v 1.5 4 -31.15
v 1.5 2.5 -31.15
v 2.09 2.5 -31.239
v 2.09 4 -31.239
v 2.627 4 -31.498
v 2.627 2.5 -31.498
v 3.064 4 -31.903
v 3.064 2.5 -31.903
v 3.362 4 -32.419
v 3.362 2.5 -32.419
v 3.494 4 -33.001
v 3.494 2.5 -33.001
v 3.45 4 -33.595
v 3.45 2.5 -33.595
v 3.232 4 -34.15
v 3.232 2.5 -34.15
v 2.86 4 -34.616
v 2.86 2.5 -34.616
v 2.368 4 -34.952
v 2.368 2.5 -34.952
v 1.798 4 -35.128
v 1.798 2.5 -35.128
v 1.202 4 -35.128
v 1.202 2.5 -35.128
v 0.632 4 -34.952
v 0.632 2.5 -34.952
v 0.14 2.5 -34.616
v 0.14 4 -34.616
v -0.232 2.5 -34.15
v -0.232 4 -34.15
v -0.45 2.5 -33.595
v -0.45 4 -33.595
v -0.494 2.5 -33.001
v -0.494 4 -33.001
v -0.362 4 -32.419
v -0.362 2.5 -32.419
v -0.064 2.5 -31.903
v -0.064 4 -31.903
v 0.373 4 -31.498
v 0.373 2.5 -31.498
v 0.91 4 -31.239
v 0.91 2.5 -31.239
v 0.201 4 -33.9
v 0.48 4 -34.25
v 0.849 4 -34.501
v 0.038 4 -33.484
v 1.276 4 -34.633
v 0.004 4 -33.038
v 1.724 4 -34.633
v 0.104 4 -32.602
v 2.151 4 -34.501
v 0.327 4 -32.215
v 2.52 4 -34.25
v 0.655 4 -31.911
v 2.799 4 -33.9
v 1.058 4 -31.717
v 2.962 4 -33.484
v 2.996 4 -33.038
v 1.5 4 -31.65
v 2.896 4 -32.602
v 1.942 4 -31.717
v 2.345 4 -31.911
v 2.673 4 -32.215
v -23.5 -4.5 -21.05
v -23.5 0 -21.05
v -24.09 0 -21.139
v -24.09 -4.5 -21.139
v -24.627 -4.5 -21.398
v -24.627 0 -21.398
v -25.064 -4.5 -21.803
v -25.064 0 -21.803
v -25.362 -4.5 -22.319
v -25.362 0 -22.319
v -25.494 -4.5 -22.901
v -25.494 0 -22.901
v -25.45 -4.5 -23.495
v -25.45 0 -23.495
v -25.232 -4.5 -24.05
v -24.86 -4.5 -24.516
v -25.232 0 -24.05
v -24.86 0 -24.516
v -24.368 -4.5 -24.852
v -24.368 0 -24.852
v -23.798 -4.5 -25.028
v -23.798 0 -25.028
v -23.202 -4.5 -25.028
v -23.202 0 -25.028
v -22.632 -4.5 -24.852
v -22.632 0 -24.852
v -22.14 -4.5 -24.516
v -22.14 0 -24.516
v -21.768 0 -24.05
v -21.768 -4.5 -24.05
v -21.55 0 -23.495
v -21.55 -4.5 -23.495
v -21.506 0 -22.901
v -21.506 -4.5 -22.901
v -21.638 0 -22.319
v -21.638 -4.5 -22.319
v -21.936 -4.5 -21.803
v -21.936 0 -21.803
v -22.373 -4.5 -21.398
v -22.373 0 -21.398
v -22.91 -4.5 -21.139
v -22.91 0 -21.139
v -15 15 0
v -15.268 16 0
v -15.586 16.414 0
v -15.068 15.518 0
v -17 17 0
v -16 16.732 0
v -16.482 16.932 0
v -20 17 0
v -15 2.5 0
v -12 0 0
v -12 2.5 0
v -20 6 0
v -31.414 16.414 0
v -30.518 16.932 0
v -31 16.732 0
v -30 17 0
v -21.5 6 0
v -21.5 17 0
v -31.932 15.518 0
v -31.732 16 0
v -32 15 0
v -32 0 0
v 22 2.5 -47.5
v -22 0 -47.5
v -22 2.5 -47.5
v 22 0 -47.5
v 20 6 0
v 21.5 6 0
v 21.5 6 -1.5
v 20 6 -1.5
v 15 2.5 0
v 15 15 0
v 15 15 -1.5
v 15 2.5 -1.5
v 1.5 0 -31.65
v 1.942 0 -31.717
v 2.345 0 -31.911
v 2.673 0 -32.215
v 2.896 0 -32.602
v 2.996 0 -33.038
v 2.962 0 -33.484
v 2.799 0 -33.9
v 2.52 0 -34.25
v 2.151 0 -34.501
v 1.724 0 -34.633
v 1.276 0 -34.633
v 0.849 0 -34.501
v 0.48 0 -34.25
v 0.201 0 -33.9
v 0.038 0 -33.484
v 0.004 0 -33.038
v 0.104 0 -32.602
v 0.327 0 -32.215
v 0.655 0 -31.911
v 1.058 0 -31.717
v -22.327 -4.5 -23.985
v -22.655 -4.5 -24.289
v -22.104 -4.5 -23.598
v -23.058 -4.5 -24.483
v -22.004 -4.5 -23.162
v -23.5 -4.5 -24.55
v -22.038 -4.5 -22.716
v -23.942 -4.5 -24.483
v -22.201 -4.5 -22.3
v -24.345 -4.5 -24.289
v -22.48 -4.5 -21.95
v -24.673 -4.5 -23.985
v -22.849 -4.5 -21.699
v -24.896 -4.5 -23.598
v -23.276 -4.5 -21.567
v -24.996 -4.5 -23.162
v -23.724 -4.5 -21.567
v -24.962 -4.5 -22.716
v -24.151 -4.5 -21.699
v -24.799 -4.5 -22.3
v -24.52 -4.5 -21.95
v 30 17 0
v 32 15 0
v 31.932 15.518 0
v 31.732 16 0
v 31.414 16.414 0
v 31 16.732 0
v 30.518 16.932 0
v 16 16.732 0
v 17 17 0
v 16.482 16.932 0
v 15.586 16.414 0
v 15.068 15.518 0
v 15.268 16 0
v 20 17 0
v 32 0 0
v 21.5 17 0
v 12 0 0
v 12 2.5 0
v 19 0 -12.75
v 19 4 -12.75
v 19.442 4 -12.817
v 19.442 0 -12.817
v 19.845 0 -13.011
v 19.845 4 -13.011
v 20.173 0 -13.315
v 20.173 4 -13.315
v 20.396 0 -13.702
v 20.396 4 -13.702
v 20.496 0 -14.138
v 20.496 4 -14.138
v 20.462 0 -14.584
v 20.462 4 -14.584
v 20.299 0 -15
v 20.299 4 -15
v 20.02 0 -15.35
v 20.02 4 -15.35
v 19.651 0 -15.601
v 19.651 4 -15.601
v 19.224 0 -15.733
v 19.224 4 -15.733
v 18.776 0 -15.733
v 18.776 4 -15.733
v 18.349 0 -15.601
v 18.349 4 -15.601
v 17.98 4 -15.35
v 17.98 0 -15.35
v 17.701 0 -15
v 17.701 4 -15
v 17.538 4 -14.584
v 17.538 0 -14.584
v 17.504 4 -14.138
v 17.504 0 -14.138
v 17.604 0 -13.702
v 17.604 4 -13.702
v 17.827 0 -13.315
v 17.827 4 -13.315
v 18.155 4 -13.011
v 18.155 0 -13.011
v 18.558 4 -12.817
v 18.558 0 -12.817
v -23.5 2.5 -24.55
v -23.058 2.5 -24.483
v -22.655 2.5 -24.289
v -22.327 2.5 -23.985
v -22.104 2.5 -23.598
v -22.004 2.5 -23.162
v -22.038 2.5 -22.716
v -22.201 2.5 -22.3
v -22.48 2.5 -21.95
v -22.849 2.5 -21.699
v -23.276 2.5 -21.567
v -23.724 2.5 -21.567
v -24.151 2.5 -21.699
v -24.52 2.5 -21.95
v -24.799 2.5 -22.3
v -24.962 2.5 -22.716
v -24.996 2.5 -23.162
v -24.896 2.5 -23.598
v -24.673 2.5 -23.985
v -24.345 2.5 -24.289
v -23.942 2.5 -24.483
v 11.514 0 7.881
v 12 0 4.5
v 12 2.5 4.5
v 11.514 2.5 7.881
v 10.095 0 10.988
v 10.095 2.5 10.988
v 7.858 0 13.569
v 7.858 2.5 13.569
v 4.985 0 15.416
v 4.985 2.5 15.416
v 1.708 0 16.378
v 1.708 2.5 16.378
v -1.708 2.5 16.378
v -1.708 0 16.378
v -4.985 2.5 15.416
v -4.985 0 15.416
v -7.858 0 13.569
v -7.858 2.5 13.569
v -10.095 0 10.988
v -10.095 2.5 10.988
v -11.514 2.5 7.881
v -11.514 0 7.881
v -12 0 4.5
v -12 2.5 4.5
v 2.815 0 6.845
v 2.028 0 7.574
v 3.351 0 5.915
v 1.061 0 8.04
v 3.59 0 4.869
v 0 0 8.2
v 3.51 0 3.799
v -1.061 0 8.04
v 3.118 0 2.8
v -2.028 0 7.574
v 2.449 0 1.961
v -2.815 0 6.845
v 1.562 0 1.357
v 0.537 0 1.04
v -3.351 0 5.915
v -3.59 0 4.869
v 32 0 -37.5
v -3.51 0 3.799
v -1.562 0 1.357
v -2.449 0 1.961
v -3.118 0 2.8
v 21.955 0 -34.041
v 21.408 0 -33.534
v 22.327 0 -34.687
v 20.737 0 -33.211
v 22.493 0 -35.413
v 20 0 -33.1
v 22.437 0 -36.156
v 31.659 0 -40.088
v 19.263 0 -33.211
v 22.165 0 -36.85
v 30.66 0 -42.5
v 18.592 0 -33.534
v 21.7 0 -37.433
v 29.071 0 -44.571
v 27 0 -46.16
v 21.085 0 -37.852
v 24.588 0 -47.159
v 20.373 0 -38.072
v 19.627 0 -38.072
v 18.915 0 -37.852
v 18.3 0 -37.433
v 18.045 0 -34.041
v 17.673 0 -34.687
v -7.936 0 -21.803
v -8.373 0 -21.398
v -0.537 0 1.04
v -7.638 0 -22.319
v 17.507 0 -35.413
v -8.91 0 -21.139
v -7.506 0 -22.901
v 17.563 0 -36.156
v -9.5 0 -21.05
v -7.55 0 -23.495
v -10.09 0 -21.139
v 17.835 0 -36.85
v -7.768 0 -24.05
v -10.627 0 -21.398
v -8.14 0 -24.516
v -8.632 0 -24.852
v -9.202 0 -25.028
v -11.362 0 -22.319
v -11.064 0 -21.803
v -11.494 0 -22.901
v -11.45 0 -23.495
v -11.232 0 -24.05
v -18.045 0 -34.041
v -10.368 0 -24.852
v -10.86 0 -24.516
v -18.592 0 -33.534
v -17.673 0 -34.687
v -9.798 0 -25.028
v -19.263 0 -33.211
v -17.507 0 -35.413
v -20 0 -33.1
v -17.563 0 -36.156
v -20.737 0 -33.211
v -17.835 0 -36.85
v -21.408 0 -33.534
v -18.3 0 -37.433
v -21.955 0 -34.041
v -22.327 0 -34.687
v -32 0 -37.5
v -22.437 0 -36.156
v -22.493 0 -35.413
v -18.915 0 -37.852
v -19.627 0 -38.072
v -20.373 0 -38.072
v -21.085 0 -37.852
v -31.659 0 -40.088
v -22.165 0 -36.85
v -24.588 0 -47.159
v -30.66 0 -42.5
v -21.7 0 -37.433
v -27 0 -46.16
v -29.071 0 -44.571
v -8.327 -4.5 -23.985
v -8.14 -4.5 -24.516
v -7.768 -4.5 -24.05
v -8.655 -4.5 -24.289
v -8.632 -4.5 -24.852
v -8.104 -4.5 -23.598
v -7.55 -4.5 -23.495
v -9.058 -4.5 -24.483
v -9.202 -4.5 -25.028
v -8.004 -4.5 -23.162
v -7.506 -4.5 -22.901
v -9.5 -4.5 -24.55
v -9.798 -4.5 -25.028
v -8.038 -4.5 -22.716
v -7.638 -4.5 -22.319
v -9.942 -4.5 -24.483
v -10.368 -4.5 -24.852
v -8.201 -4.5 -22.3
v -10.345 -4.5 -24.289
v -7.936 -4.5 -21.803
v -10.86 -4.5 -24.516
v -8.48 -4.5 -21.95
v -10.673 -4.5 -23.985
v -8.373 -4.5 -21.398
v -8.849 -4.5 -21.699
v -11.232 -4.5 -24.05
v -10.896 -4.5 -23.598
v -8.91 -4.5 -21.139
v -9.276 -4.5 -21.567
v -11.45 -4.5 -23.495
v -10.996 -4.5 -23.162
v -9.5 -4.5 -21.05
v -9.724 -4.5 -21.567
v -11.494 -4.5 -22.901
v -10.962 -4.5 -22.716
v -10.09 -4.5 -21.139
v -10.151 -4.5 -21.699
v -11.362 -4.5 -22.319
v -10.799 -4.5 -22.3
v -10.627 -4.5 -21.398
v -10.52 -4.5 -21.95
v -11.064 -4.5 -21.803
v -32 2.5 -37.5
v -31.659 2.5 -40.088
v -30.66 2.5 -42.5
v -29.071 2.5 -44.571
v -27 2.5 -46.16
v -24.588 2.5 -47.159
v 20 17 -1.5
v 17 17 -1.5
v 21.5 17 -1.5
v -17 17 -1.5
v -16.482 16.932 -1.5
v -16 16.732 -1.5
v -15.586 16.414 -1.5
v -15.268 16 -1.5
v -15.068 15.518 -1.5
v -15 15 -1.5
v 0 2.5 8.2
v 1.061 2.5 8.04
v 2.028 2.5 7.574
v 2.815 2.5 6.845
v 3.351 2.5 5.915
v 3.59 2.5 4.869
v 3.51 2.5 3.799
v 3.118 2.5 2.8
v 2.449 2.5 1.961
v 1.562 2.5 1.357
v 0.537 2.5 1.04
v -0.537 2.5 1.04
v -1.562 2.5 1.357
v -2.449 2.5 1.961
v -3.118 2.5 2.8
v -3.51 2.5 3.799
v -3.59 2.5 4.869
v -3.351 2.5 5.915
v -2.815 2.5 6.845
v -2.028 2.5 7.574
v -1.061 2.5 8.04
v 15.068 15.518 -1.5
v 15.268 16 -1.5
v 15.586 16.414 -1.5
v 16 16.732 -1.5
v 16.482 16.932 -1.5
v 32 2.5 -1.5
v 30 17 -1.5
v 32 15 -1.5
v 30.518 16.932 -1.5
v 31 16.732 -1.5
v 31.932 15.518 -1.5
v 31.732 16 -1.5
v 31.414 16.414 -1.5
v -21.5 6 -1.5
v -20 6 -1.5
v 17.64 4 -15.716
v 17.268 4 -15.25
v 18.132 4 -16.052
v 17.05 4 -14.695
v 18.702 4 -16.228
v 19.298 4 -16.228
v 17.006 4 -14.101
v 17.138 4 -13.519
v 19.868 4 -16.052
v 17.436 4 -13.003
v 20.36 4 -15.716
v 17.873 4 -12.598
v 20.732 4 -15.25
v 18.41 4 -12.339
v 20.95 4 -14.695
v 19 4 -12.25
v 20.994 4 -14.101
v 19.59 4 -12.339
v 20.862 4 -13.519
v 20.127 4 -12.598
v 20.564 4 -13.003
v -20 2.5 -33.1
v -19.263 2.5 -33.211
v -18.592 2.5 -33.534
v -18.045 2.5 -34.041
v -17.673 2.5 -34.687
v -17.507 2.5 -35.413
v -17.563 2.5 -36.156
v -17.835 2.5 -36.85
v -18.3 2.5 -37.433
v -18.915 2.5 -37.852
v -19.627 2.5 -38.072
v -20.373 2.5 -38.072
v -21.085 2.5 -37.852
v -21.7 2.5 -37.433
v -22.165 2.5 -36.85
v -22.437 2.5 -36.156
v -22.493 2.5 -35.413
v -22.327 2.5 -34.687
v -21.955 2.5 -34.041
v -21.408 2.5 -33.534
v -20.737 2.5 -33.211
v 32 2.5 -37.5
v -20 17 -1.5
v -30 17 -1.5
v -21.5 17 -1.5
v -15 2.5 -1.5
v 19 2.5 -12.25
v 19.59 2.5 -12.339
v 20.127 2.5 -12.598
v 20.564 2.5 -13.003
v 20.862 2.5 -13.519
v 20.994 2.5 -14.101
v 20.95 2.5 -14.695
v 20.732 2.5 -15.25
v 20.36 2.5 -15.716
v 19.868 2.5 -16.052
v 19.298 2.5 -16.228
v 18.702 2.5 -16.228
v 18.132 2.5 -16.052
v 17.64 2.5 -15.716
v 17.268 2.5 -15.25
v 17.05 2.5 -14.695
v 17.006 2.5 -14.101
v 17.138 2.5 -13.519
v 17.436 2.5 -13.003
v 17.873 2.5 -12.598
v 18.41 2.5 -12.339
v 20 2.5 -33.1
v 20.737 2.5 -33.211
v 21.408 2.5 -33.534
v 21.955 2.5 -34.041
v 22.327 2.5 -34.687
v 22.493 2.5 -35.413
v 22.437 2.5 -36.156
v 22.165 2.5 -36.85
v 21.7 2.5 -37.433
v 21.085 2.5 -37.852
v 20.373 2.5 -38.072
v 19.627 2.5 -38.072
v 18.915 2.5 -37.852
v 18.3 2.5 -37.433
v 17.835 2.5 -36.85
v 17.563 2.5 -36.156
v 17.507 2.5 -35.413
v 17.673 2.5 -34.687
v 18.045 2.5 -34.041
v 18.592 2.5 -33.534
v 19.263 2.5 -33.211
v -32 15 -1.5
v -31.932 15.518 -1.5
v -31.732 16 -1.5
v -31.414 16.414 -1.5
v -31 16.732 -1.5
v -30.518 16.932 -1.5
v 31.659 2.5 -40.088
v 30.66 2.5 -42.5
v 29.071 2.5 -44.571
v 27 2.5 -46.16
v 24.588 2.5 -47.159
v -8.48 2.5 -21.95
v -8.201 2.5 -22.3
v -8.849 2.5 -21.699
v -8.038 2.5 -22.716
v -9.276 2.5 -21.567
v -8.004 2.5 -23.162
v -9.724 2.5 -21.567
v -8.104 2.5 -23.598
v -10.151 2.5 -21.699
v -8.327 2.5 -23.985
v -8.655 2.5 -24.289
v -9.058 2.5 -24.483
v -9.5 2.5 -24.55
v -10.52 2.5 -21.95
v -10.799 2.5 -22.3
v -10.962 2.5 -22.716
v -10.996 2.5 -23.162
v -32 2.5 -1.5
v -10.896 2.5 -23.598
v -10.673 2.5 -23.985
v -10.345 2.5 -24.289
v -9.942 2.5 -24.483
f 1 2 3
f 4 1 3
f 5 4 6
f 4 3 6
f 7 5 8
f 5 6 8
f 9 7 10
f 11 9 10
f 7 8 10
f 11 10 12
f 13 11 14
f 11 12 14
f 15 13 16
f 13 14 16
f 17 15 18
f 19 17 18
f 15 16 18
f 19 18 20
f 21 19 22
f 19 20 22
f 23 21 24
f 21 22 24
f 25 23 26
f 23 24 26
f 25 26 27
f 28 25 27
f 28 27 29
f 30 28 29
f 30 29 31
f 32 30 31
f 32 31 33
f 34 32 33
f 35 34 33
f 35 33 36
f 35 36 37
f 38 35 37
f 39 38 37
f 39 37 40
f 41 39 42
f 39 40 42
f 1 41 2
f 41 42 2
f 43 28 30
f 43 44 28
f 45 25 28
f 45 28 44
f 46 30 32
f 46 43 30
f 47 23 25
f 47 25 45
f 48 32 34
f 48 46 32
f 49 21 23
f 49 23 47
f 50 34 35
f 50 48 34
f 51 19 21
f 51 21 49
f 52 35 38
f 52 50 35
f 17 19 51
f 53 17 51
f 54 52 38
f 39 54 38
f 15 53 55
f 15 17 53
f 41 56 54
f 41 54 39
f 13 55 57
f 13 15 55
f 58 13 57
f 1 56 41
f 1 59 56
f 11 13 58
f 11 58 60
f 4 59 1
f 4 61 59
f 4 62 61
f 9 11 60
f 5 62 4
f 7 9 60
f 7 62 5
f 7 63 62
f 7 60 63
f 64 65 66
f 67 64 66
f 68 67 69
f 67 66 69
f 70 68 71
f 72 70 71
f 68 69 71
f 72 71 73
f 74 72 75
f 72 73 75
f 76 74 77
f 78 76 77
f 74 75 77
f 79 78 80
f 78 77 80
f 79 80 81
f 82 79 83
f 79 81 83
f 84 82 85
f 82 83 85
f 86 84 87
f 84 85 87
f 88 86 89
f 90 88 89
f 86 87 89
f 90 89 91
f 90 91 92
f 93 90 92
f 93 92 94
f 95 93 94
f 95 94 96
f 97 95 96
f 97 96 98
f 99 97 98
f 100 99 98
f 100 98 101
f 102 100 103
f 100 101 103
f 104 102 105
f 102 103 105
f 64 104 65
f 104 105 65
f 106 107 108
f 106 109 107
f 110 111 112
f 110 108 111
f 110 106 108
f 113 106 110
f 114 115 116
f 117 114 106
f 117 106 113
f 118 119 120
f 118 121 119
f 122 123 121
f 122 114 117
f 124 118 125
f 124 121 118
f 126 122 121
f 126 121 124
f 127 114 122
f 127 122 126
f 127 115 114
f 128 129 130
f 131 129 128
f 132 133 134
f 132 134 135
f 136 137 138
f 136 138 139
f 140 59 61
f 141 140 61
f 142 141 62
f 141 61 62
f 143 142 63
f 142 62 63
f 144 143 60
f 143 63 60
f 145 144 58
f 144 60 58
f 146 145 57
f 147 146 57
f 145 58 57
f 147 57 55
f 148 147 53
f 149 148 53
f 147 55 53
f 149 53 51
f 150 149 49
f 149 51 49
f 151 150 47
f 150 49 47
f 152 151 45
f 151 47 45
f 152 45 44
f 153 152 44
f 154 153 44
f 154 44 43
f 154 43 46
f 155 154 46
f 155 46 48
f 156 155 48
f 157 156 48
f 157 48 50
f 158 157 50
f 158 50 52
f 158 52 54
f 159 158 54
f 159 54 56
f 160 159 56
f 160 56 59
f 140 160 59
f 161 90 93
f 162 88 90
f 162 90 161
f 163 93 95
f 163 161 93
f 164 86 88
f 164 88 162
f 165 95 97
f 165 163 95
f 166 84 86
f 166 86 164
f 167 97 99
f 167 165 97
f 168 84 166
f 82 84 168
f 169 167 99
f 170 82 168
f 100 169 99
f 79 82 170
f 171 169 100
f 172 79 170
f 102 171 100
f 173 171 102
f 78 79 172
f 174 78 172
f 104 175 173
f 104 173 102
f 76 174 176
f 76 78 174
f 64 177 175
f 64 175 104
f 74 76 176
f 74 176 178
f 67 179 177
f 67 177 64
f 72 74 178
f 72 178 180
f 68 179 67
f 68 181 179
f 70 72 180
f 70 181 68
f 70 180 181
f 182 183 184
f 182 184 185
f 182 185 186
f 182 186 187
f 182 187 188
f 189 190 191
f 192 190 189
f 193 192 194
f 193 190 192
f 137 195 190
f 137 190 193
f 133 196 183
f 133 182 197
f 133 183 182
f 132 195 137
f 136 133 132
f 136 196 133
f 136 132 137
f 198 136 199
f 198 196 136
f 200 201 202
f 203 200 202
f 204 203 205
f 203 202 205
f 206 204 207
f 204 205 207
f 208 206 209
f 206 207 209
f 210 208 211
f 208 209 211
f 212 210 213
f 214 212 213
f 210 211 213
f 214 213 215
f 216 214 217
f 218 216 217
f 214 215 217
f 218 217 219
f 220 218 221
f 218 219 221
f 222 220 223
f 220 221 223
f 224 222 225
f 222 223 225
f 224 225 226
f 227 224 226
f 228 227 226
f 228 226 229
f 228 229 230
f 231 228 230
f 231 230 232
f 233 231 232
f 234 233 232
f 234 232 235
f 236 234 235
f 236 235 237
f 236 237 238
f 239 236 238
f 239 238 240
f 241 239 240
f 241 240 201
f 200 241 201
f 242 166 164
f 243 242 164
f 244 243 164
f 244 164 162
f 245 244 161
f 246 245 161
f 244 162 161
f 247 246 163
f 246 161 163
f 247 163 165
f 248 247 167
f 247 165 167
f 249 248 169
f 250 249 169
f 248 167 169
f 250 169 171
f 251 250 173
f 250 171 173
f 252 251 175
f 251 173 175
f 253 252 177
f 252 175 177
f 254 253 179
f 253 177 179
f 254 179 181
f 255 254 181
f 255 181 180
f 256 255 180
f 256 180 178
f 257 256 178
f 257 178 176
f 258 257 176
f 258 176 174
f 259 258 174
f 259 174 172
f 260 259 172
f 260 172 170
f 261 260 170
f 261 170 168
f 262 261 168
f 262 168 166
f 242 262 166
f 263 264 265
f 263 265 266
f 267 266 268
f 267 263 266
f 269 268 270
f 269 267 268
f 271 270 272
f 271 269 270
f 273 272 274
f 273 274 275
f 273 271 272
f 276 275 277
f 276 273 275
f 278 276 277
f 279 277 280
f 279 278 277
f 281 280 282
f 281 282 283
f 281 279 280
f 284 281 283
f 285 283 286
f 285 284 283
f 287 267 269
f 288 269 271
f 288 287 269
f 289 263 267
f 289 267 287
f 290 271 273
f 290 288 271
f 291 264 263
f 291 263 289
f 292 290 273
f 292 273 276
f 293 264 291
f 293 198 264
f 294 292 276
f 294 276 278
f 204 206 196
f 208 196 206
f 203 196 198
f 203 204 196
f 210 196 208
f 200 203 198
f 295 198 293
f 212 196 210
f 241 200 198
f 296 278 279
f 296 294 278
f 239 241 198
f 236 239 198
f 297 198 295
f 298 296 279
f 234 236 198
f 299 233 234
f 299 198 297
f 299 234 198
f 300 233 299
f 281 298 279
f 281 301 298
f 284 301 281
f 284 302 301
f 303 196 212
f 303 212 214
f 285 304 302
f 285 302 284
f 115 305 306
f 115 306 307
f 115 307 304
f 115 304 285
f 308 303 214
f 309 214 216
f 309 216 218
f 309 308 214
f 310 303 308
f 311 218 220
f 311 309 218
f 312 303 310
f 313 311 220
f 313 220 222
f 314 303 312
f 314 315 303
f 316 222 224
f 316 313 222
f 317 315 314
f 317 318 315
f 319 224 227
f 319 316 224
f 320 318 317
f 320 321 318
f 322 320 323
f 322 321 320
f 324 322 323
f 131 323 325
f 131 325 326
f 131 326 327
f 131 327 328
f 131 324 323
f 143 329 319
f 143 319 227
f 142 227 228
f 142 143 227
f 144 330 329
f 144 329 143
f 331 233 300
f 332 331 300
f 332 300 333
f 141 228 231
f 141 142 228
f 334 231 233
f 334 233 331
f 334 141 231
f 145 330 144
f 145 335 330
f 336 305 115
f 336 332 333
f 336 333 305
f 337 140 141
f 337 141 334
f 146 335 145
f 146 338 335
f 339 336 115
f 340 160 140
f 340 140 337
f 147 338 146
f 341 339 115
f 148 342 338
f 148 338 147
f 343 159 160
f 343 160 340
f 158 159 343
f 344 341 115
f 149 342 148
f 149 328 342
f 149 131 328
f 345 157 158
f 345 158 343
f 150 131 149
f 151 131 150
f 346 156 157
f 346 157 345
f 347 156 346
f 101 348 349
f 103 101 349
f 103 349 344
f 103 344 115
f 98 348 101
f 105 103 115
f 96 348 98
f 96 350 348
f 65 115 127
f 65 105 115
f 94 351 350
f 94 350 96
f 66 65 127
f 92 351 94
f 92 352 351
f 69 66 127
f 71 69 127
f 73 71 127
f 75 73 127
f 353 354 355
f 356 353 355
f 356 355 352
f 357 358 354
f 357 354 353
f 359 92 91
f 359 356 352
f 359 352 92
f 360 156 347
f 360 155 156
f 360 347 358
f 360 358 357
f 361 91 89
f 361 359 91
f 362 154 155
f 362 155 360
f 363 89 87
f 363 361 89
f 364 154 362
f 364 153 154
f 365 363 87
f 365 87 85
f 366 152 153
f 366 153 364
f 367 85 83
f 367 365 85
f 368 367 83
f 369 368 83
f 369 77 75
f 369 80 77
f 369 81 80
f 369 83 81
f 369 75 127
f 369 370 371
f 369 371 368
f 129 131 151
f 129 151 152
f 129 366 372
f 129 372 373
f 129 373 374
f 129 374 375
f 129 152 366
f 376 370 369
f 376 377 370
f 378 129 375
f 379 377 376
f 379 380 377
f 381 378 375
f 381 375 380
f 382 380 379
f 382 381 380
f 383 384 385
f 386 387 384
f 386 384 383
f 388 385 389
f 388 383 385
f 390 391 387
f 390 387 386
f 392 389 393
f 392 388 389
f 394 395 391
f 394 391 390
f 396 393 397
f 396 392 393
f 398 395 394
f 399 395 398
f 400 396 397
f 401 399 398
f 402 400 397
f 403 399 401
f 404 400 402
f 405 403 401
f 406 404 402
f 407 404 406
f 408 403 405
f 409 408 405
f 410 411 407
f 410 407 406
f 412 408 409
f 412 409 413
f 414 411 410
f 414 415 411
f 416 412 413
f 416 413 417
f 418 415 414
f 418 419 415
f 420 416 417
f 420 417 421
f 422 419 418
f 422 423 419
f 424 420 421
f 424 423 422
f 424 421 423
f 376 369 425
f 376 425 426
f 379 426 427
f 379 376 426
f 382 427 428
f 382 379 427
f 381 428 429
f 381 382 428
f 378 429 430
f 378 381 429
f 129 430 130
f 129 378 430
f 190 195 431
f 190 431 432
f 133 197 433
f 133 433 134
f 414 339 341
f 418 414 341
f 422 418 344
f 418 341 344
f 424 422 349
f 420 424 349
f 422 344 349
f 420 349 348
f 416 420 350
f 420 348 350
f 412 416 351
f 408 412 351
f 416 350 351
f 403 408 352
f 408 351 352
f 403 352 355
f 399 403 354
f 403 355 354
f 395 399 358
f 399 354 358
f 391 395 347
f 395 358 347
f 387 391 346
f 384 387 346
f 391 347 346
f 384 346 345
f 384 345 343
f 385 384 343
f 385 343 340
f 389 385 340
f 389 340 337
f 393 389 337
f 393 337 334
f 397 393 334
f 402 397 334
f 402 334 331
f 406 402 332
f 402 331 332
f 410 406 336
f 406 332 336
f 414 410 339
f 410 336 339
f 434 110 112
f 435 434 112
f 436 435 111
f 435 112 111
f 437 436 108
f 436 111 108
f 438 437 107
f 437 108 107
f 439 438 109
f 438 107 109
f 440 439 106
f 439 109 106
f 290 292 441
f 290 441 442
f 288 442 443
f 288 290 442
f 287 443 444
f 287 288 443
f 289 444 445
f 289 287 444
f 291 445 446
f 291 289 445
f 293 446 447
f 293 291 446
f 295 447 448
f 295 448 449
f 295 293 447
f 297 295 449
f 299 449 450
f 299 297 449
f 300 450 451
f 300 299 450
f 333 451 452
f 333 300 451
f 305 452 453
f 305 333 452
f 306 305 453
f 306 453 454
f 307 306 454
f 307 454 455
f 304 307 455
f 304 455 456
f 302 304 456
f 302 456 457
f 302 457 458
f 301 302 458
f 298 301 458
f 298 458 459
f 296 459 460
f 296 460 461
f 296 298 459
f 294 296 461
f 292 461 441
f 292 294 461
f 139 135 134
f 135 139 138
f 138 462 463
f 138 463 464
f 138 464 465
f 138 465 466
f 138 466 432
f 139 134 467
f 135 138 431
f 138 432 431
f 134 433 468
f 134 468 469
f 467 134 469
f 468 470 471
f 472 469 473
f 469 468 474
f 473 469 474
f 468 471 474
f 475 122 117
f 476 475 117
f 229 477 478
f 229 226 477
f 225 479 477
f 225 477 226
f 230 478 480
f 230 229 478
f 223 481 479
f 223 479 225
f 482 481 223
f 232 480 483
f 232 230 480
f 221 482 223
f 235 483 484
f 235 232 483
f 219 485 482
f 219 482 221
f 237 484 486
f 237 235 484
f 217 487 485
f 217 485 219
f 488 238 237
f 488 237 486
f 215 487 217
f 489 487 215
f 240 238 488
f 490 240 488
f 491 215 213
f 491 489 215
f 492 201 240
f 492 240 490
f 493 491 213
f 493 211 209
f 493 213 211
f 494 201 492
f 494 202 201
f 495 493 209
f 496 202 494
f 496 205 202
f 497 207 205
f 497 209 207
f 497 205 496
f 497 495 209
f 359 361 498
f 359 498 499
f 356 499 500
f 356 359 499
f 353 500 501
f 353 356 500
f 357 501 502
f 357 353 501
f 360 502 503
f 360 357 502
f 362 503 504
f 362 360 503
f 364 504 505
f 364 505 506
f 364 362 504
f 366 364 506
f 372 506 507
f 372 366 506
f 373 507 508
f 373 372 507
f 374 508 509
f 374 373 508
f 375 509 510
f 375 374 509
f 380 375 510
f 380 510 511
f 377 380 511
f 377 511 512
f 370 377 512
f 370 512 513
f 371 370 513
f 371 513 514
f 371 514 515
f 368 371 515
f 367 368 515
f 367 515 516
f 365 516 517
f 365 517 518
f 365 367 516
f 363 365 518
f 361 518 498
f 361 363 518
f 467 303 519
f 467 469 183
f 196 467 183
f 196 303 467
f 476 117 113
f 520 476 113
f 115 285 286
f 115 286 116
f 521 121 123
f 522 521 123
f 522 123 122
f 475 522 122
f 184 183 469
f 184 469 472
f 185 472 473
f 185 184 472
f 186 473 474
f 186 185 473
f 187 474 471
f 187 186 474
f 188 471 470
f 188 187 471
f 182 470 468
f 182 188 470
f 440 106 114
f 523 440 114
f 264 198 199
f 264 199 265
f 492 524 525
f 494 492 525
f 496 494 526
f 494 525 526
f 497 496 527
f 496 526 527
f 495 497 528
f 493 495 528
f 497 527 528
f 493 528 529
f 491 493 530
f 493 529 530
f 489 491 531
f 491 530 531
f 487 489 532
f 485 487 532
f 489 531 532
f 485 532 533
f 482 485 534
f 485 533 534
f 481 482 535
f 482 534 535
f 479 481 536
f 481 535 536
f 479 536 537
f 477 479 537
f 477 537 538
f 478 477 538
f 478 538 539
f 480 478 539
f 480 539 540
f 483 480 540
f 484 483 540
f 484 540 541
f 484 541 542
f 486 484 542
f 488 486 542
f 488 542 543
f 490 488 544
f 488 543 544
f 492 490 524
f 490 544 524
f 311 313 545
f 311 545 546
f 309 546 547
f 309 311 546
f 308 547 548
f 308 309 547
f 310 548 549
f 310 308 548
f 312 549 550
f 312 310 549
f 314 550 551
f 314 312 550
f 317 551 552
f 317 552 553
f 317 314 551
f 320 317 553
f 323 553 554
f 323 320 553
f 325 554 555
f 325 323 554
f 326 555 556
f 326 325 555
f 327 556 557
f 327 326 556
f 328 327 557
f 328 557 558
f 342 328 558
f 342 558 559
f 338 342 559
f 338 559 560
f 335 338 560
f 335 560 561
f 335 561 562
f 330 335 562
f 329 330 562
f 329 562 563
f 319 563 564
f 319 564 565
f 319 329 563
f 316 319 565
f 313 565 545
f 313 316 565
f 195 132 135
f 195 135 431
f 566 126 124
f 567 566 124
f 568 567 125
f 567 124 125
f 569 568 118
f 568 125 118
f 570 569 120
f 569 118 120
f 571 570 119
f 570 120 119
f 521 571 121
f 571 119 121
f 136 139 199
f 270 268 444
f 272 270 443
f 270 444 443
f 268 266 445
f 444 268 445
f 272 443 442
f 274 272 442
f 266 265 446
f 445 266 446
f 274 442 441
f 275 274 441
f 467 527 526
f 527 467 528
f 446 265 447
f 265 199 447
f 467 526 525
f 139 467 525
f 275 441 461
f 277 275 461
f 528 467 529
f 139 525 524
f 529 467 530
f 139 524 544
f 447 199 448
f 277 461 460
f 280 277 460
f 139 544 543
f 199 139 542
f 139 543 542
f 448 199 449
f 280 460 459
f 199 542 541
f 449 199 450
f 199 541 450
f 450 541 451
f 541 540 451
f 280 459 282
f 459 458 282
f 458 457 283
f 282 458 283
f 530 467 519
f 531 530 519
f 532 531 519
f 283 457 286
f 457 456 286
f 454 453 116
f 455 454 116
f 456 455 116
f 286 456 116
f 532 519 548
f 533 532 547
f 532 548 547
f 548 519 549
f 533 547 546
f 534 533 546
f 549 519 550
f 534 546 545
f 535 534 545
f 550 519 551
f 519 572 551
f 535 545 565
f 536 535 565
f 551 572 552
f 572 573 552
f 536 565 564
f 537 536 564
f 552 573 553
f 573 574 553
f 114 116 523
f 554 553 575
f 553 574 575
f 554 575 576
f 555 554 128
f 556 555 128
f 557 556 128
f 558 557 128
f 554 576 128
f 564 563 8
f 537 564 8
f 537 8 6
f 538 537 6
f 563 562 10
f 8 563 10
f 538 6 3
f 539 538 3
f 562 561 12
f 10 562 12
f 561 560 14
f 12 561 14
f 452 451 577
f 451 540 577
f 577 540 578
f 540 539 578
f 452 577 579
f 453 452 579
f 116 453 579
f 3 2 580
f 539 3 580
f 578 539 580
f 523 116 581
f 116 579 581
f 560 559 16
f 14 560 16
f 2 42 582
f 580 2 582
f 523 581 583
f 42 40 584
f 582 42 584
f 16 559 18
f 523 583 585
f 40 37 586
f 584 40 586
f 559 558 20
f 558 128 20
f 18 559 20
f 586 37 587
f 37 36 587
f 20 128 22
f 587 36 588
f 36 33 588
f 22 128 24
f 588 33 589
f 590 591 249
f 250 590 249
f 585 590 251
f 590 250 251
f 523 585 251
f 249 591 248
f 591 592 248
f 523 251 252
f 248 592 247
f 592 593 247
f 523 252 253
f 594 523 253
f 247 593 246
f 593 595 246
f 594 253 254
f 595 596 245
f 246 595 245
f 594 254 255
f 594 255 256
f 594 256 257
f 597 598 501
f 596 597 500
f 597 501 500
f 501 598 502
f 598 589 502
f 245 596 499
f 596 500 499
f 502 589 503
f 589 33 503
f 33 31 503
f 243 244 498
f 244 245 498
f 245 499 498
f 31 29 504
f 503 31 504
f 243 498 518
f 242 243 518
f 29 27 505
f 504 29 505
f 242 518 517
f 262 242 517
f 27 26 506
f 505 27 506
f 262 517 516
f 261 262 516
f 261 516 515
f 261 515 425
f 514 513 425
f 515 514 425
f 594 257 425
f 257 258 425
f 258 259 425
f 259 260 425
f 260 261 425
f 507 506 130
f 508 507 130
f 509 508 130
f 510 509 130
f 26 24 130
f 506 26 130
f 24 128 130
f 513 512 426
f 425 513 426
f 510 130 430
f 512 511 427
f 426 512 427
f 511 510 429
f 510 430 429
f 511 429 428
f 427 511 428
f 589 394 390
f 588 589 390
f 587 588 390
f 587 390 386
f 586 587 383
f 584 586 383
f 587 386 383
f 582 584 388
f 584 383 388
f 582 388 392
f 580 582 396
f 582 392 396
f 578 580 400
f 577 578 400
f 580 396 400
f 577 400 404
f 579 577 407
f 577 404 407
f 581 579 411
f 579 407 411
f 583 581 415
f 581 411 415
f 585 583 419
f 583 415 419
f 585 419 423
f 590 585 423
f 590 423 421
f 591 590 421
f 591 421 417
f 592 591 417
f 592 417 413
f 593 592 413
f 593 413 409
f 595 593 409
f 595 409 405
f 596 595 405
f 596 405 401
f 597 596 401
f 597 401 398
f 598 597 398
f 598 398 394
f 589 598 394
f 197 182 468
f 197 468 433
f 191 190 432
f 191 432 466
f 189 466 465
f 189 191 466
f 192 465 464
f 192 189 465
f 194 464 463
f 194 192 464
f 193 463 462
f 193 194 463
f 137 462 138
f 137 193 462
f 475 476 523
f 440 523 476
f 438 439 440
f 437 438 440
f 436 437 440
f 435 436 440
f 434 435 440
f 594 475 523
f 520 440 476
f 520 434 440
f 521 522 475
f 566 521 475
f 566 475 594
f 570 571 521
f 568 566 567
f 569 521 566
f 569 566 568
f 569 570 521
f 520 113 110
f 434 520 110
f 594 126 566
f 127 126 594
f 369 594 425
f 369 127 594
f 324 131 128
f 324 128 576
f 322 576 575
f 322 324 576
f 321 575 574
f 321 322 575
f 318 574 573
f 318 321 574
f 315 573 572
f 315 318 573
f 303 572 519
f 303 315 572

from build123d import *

# Parameters (mm, degrees)
SKETCH1_R                = 3.6
SKETCH1_R_2              = 2.5
MAIN_BOSS_DEPTH          = 2.5
SKETCH2_R                = 2
SMALL_HOLE_EXTRUDE_DEPTH = 1.5
SKETCH3_R                = 1.5
SMALL_HOLE_DEPTH         = 58.412977627
SKETCH4_R                = 2
LONG_HOLE_EXTRUDE_DEPTH  = 4.5
SKETCH5_R                = 1.5
LONG_HOLE_DEPTH          = 58.900777197
SIDE_BOSS_DEPTH          = 1.5


with BuildPart() as part:
    # Sketch1 → main boss (new body)
    with BuildSketch(Plane(origin=(0, 0, 0), x_dir=(1, 0, 0), z_dir=(0, 1, 0))):
        with BuildLine():
            Line((32, 0), (12, 0))
            Line((12, 0), (12, -4.5))
            ThreePointArc((12, -4.5), (0, -16.5), (-12, -4.5))
            Line((-12, -4.5), (-12, 0))
            Line((-12, 0), (-32, 0))
            Line((-32, 0), (-32, 37.5))
            ThreePointArc((-32, 37.5), (-29.071067812, 44.571067812), (-22, 47.5))
            Line((-22, 47.5), (22, 47.5))
            ThreePointArc((22, 47.5), (29.071067812, 44.571067812), (32, 37.5))
            Line((32, 37.5), (32, 0))
        make_face()
        with Locations(Location((0, -4.6, 0), (0, 0, 270))):
            Circle(SKETCH1_R, mode=Mode.SUBTRACT)
        with Locations(Location((20, 35.6, 0), (0, 0, 270))):
            Circle(SKETCH1_R_2, mode=Mode.SUBTRACT)
        with Locations(Location((-20, 35.6, 0), (0, 0, 270))):
            Circle(SKETCH1_R_2, mode=Mode.SUBTRACT)
    extrude(amount=MAIN_BOSS_DEPTH)

    # Sketch2 → small hole extrude (add)
    with BuildSketch(Plane(origin=(0, 2.5, 0), x_dir=(1, 0, 0), z_dir=(0, 1, 0))):
        with Locations(Location((1.5, 33.15, 0), (0, 0, 270))):
            Circle(SKETCH2_R)
        with Locations(Location((19, 14.25, 0), (0, 0, 270))):
            Circle(SKETCH2_R)
    extrude(amount=SMALL_HOLE_EXTRUDE_DEPTH)

    # Sketch3 → small hole (cut, through all)
    with BuildSketch(Plane(origin=(0, 4, 0), x_dir=(1, 0, 0), z_dir=(0, 1, 0))):
        with Locations(Location((1.5, 33.15, 0), (0, 0, 270))):
            Circle(SKETCH3_R)
        with Locations(Location((19, 14.25, 0), (0, 0, 270))):
            Circle(SKETCH3_R)
    extrude(amount=-SMALL_HOLE_DEPTH, mode=Mode.SUBTRACT)

    # Sketch4 → long hole extrude (add)
    with BuildSketch(Plane.XZ):
        with Locations(Location((-23.5, -23.05, 0), (0, 0, 90))):
            Circle(SKETCH4_R)
        with Locations(Location((-9.5, -23.05, 0), (0, 0, 90))):
            Circle(SKETCH4_R)
    extrude(amount=LONG_HOLE_EXTRUDE_DEPTH)

    # Sketch5 → long hole (cut, through all)
    with BuildSketch(Plane.XZ.offset(4.5)):
        with Locations(Location((-23.5, -23.05, 0), (0, 0, 270))):
            Circle(SKETCH5_R)
        with Locations(Location((-9.5, -23.05, 0), (0, 0, 270))):
            Circle(SKETCH5_R)
    extrude(amount=-LONG_HOLE_DEPTH, mode=Mode.SUBTRACT)

    # Sketch6 → side boss (add)
    with BuildSketch(Plane.XY):
        with BuildLine():
            Line((-32, 0), (-32, 15))
            ThreePointArc((-32, 15), (-31.414213562, 16.414213562), (-30, 17))
            Line((-30, 17), (-21.5, 17))
            Line((-21.5, 17), (-21.5, 6))
            Line((-21.5, 6), (-20, 6))
            Line((-20, 6), (-20, 17))
            Line((-20, 17), (-17, 17))
            ThreePointArc((-17, 17), (-15.585786438, 16.414213562), (-15, 15))
            Line((-15, 15), (-15, 0))
            Line((-15, 0), (-32, 0))
        make_face()
    side_boss = extrude(amount=-SIDE_BOSS_DEPTH)

    # Mirror1: side boss across plane
    add(side_boss.mirror(Plane(origin=(0, 0, 0), x_dir=(0, 0, 1), z_dir=(1, 0, 0))))


solid = part.part
